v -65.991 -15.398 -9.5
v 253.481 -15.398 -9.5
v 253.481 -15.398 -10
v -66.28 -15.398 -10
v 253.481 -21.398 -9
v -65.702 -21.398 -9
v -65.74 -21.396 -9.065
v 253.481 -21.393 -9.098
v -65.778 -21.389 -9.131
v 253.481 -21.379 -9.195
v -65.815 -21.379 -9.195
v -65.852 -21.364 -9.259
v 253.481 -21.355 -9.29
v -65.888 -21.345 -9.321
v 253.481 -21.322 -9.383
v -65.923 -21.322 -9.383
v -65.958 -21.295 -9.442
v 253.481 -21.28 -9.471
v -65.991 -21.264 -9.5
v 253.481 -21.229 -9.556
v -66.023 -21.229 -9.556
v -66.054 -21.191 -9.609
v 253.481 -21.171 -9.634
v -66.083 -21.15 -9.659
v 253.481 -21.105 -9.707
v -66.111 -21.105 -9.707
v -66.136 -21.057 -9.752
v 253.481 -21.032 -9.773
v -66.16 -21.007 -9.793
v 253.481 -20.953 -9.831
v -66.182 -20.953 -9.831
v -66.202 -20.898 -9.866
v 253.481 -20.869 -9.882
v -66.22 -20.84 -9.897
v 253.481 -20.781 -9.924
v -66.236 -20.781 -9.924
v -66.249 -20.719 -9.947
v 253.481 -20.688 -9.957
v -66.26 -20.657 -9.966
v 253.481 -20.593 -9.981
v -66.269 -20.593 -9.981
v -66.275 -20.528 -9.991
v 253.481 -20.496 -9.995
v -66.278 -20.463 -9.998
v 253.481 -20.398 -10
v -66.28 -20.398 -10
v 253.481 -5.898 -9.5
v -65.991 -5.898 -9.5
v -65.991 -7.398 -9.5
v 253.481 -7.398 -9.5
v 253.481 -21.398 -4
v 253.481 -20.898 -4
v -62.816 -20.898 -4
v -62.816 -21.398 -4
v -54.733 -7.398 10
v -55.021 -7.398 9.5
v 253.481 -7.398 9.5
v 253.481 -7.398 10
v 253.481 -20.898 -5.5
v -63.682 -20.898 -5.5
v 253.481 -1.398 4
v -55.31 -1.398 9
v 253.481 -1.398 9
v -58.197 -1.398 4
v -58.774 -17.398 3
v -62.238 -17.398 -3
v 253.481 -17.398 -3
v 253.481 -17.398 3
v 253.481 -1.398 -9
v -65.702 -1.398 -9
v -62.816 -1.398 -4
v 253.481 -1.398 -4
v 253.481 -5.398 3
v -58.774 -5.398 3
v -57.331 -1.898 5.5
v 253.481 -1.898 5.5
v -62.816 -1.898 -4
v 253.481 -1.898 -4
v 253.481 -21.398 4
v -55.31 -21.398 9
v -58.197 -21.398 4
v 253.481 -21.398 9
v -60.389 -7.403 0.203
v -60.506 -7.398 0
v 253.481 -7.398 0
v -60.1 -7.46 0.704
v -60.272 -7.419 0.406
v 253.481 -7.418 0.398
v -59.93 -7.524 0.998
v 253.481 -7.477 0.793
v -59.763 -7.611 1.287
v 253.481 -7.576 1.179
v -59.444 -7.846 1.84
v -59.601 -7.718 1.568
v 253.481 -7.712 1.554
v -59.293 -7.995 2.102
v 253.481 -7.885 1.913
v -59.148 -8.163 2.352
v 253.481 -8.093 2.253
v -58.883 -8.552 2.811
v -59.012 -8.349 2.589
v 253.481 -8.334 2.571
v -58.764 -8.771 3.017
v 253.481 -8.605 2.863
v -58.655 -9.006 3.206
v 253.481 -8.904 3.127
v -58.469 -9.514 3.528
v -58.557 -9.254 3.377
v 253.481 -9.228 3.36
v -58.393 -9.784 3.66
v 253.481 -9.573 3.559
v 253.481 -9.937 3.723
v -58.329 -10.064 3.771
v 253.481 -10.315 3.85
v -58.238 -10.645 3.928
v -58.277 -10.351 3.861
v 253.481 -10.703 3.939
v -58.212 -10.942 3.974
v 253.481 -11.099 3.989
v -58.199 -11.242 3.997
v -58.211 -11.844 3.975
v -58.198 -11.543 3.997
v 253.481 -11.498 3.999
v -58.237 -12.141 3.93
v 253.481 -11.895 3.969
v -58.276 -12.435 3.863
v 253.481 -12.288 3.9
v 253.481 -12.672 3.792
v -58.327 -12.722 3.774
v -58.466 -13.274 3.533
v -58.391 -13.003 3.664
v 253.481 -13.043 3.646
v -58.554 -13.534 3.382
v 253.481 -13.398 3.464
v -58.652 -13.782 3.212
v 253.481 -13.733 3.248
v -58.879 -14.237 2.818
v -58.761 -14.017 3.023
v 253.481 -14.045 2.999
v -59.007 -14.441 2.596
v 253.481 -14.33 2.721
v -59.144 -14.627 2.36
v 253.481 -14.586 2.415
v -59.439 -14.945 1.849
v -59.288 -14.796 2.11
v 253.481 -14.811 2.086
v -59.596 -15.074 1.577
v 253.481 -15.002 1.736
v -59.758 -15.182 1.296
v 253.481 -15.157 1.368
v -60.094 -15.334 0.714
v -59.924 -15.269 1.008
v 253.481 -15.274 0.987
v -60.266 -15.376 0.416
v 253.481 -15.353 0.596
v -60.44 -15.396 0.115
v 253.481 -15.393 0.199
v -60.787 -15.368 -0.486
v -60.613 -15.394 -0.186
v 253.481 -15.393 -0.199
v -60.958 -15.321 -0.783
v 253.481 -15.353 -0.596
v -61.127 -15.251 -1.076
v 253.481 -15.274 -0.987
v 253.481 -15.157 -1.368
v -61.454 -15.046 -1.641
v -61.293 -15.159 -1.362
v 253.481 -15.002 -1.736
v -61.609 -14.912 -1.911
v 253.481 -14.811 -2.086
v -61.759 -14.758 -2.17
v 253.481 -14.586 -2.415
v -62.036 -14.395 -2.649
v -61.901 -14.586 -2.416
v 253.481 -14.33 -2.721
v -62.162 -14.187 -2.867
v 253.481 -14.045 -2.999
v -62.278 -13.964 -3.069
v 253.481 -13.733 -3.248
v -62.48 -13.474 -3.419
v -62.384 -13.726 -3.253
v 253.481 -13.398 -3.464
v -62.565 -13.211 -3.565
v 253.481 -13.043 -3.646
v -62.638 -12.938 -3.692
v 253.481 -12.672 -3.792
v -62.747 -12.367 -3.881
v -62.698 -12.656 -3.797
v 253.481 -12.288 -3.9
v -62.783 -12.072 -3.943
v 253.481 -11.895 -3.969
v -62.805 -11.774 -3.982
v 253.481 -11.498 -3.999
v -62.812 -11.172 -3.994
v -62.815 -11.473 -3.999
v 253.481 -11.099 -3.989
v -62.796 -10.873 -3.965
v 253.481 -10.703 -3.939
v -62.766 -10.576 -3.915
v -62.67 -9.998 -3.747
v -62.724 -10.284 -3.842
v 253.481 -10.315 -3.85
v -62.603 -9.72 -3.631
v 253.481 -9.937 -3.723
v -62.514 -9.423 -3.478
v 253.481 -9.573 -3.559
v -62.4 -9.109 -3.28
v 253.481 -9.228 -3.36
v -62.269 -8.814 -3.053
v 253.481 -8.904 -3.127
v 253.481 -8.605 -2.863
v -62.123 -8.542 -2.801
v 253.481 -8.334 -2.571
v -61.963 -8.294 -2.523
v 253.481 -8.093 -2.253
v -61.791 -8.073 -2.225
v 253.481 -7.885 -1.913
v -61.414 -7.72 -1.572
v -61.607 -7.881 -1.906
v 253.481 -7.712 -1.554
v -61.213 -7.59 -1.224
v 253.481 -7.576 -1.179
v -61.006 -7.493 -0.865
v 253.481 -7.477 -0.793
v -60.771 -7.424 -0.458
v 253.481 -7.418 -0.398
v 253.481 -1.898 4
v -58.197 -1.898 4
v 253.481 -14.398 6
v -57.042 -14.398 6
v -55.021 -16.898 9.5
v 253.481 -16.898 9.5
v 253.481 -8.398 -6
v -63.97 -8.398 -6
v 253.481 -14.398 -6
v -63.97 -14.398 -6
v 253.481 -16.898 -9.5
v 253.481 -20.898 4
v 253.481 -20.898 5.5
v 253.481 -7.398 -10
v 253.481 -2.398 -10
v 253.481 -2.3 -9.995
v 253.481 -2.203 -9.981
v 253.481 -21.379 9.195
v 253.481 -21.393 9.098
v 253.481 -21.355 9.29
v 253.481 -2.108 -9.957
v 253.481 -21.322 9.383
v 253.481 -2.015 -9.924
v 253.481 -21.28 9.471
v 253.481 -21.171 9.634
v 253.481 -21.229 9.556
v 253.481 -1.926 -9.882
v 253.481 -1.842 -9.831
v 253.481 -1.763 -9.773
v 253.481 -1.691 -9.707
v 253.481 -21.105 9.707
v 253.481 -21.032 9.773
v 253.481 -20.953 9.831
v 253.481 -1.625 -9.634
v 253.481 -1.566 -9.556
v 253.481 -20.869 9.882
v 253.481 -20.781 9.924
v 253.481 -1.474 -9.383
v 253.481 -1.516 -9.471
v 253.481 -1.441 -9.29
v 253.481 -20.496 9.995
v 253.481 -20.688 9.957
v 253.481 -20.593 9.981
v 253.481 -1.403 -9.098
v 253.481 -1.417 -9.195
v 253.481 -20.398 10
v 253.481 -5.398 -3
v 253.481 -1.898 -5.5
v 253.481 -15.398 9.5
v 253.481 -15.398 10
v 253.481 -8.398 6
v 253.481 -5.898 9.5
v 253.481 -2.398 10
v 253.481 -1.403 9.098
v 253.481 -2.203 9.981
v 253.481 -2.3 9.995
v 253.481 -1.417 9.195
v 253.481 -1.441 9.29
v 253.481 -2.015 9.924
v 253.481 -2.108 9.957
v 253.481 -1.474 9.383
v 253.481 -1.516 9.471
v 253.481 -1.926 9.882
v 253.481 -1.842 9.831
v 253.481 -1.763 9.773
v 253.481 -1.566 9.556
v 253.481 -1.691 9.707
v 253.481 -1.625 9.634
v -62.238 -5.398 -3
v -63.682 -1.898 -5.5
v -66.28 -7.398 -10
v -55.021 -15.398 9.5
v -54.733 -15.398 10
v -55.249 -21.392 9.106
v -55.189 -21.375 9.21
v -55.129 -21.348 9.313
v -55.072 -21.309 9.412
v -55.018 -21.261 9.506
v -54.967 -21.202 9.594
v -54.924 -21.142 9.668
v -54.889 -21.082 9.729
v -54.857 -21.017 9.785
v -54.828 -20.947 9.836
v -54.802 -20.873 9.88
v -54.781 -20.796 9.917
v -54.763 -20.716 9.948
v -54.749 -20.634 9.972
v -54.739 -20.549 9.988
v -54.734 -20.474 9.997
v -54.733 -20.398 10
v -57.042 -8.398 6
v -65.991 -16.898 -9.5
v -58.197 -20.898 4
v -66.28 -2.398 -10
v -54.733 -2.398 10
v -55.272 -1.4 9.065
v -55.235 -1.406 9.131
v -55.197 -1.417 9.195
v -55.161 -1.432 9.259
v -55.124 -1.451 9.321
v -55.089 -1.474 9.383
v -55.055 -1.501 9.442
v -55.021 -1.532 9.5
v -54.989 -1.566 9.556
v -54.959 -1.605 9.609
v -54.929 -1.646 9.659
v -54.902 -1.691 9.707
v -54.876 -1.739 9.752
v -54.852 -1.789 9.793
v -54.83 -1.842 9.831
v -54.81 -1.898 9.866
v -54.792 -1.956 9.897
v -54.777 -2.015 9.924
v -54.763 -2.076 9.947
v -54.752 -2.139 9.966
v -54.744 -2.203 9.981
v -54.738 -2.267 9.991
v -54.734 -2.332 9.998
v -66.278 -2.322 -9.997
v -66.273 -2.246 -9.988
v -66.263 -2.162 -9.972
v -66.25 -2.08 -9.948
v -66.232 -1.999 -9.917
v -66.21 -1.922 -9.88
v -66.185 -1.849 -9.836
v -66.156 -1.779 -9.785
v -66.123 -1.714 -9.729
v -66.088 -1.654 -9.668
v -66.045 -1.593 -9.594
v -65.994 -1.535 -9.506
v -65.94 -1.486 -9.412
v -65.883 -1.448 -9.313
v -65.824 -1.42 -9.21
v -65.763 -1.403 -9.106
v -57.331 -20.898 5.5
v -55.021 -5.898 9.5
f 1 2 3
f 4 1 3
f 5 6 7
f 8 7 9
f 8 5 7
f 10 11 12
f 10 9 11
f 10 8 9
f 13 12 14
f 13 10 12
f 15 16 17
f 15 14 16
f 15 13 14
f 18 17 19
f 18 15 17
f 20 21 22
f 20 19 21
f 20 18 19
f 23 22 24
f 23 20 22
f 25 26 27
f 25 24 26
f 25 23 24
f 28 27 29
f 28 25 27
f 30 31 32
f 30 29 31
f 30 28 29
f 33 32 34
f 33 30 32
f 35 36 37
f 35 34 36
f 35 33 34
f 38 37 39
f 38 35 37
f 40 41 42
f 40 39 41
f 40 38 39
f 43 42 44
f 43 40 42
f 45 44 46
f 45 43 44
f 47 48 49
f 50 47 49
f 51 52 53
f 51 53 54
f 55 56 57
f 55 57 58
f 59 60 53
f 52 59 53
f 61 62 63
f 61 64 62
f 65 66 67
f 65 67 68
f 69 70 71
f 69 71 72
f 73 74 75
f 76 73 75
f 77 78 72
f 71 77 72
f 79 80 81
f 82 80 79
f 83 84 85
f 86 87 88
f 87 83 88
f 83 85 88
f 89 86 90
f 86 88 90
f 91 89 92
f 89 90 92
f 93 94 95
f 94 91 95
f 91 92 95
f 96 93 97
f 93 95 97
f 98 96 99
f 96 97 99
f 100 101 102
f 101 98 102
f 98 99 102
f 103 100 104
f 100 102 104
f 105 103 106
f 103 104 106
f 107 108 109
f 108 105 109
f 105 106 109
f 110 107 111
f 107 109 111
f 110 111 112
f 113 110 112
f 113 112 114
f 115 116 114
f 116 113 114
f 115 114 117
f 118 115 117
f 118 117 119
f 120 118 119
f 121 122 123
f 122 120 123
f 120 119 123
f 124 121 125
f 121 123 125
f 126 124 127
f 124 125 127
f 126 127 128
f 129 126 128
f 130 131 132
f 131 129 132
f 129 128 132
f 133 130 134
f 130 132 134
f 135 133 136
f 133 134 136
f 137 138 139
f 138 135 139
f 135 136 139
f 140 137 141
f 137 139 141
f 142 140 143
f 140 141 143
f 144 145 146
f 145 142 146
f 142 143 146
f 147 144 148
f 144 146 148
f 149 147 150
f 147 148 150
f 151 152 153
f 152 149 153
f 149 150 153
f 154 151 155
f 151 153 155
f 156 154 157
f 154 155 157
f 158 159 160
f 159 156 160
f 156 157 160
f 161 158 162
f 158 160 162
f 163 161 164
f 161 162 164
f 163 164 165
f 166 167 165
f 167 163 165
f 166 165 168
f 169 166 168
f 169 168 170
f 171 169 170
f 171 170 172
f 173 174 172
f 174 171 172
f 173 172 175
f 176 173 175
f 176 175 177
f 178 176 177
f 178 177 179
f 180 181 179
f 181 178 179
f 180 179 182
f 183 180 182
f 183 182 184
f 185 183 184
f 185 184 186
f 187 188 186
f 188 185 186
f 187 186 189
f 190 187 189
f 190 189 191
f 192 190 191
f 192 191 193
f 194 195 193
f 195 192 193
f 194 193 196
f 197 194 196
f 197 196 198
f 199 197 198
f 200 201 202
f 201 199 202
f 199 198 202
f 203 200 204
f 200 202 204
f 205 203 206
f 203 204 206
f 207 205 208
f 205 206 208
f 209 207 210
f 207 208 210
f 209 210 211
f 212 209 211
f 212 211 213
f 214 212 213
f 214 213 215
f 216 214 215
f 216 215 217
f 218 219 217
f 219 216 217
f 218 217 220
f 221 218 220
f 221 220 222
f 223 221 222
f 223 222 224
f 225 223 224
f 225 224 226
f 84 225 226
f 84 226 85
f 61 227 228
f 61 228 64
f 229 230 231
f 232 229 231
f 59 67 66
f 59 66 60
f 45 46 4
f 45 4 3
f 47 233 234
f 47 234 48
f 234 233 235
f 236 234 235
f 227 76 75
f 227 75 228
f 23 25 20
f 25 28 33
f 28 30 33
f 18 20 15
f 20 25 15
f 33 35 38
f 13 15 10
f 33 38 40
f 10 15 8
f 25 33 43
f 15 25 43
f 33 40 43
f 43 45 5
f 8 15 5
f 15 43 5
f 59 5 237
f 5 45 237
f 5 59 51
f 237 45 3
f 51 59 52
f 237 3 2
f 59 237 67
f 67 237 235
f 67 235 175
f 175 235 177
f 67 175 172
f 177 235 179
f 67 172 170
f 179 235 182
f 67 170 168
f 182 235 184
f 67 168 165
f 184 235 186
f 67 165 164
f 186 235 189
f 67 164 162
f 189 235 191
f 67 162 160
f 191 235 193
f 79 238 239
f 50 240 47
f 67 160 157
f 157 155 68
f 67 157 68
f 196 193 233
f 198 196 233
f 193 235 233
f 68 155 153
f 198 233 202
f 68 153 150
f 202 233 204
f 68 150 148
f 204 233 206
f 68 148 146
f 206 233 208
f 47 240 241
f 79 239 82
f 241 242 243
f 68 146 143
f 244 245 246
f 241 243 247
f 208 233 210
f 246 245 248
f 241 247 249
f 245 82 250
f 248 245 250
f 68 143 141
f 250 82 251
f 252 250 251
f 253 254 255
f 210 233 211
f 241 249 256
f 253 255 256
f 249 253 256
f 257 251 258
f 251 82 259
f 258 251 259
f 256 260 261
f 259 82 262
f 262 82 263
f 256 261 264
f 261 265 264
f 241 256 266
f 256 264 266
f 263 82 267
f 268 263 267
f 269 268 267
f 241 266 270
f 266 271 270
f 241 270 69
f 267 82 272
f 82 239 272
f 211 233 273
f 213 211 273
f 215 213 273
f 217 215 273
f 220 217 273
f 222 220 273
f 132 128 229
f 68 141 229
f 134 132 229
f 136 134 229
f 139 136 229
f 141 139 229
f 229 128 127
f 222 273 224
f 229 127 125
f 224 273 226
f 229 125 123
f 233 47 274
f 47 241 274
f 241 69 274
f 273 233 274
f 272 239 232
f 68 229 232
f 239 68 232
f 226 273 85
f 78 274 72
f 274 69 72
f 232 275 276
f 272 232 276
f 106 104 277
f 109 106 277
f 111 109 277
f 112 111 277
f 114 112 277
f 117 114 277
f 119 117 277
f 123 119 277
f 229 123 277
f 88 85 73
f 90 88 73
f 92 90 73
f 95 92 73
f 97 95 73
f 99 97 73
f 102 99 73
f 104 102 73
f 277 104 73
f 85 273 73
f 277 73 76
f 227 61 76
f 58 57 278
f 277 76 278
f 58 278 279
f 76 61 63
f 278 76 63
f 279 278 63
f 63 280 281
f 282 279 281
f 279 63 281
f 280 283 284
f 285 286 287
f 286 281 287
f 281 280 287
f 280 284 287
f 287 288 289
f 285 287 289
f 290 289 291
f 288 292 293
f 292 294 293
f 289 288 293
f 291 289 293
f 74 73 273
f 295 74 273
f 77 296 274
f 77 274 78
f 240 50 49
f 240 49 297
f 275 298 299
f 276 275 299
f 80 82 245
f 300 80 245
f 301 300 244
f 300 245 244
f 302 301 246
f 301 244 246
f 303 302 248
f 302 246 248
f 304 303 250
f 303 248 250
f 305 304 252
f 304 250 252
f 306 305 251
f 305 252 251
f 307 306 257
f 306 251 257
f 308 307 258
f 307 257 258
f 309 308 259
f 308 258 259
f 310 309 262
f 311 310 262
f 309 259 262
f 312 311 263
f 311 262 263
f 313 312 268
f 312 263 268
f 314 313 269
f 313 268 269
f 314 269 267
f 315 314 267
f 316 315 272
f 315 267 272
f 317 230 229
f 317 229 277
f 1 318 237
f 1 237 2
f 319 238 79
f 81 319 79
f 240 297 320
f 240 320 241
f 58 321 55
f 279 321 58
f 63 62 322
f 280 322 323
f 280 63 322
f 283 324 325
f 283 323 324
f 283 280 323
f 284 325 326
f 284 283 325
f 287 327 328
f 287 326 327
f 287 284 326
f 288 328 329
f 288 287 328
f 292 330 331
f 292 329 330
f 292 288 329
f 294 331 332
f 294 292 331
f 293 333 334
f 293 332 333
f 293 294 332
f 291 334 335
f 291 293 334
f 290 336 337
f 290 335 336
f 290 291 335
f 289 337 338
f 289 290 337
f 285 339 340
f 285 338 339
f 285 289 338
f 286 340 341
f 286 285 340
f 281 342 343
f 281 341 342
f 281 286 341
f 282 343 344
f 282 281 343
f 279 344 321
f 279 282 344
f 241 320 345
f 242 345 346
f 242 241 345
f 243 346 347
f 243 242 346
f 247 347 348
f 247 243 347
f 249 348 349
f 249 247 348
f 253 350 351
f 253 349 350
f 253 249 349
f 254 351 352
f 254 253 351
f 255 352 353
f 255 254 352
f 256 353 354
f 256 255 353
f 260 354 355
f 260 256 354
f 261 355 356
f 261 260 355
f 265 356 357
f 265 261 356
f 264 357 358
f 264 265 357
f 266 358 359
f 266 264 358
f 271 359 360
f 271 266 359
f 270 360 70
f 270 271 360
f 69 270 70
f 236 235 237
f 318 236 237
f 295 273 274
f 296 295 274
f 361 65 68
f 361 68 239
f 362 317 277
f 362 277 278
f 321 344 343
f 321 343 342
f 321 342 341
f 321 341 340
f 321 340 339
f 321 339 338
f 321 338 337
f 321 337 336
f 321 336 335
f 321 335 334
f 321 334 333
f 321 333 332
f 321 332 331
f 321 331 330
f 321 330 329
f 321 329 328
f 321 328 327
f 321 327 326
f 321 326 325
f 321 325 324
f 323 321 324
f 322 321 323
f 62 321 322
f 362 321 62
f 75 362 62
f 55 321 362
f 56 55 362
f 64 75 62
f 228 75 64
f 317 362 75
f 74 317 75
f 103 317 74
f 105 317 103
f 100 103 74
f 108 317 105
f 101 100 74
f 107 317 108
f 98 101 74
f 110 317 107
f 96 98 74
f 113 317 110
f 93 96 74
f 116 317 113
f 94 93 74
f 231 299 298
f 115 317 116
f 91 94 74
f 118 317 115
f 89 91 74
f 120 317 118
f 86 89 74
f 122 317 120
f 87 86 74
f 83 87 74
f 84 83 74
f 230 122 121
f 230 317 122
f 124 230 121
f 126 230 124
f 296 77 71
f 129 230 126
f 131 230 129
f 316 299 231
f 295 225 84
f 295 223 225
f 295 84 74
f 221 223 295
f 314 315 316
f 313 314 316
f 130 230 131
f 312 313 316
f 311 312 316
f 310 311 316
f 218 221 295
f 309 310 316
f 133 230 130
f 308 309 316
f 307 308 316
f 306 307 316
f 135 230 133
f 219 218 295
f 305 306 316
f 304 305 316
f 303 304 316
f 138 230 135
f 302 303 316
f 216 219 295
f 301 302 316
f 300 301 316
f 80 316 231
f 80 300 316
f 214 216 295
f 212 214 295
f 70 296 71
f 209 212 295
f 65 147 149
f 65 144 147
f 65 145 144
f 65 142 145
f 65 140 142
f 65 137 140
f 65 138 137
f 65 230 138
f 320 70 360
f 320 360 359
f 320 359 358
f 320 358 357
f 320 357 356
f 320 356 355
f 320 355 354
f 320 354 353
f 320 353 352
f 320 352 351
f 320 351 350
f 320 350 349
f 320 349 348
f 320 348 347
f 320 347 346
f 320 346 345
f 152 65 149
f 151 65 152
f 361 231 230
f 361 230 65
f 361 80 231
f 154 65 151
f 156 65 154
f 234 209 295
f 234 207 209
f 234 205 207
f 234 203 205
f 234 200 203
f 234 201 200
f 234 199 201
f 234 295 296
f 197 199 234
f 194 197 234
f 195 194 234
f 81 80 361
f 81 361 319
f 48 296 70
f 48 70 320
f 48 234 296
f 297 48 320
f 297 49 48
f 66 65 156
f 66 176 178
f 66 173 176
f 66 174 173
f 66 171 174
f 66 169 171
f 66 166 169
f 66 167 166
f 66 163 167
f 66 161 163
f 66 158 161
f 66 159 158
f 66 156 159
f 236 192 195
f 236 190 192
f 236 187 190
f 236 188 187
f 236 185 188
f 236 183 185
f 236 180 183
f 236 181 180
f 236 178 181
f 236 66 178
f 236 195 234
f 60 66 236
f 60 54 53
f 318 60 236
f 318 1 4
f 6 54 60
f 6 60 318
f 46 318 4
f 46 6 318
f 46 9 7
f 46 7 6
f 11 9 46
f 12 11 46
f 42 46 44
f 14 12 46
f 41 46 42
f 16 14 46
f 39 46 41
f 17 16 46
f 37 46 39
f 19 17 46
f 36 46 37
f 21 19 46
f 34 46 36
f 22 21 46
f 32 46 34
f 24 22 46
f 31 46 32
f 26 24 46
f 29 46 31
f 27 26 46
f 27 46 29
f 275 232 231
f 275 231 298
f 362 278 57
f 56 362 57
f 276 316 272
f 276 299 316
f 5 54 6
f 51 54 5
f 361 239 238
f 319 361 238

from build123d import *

# Parameters (mm, degrees)
SKETCH_1_W                       = 320
SKETCH_1_H                       = 10
EXTRUDE_1_DEPTH                  = 10
SKETCH_2_R                       = 4
CUT_EXTRUDE_1_DEPTH              = 1270
CUT_EXTRUDE_2_DEPTH              = 1270
FILLET_1_R                       = 1
PATTERN_CIRCULAR_2_COUNT         = 4
FILLET_1_OF_PATTERN_CIRCULAR_2_R = 1
CUT_EXTRUDE_4_DEPTH              = 24


with BuildPart() as part:
    # 草图1 → 凸台-拉伸1 (new body)
    with BuildSketch(Plane.XY):
        with Locations((93.481285353, -6.397869645)):
            Rectangle(SKETCH_1_W, SKETCH_1_H)
    extrude_1 = extrude(amount=EXTRUDE_1_DEPTH)

    # 草图2 → 切除-拉伸1 (cut)
    with BuildSketch(Plane(origin=(253.481285353, 0, 0), x_dir=(0, 0, -1), z_dir=(1, 0, 0))):
        with Locations((0, -11.397869645)):
            Circle(SKETCH_2_R)
    cut_extrude_1 = extrude(amount=-CUT_EXTRUDE_1_DEPTH, mode=Mode.SUBTRACT)

    # 草图3 → 切除-拉伸2 (cut)
    with BuildSketch(Plane(origin=(253.481285353, 0, 0), x_dir=(0, 0, -1), z_dir=(1, 0, 0))):
        Polygon((-4, -1.397869645), (0, -1.397869645), (0, -5.397869645), (-3, -5.397869645), (-5.5, -1.897869645), (-4, -1.897869645), align=None)
        Polygon((-10, -7.397869645), (-10, -11.397869645), (-6, -11.397869645), (-6, -8.397869645), (-9.5, -5.897869645), (-9.5, -7.397869645), align=None)
    cut_extrude_2 = extrude(amount=-CUT_EXTRUDE_2_DEPTH, mode=Mode.SUBTRACT)

    # 圆角1
    fillet_1_edges = [part.edges().sort_by_distance(p)[0] for p in [
        (93.481285353, -1.397869645, 10),
    ]]
    fillet(fillet_1_edges, radius=FILLET_1_R)

    # 阵列(圆周)2: 凸台-拉伸1, 切除-拉伸1, 切除-拉伸2 ×4 about axis
    pattern_circular_2_axis = Axis((0, -11.397869645, 0), (1, 0, 0))
    add([extrude_1.rotate(pattern_circular_2_axis, i * 360 / PATTERN_CIRCULAR_2_COUNT) for i in range(1, PATTERN_CIRCULAR_2_COUNT)])
    add([cut_extrude_1.rotate(pattern_circular_2_axis, i * 360 / PATTERN_CIRCULAR_2_COUNT) for i in range(1, PATTERN_CIRCULAR_2_COUNT)], mode=Mode.SUBTRACT)
    add([cut_extrude_2.rotate(pattern_circular_2_axis, i * 360 / PATTERN_CIRCULAR_2_COUNT) for i in range(1, PATTERN_CIRCULAR_2_COUNT)], mode=Mode.SUBTRACT)

    # 圆角1 of 阵列(圆周)2
    fillet_1_of_pattern_circular_2_edges = [part.edges().sort_by_distance(p)[0] for p in [
        (93.481285353, -21.397869645, 10),
        (93.481285353, -21.397869645, -10),
        (93.481285353, -1.397869645, -10),
    ]]
    fillet(fillet_1_of_pattern_circular_2_edges, radius=FILLET_1_OF_PATTERN_CIRCULAR_2_R)

    # 草图5 → 切除-拉伸4 (cut)
    with BuildSketch(Plane.XZ.offset(21.397869645)):
        Polygon((-78.202673037, 13.081723415), (-42.997967066, 30.32515978), (-66.48214009, -10.35062107), align=None)
    extrude(amount=-CUT_EXTRUDE_4_DEPTH, mode=Mode.SUBTRACT)


solid = part.part
